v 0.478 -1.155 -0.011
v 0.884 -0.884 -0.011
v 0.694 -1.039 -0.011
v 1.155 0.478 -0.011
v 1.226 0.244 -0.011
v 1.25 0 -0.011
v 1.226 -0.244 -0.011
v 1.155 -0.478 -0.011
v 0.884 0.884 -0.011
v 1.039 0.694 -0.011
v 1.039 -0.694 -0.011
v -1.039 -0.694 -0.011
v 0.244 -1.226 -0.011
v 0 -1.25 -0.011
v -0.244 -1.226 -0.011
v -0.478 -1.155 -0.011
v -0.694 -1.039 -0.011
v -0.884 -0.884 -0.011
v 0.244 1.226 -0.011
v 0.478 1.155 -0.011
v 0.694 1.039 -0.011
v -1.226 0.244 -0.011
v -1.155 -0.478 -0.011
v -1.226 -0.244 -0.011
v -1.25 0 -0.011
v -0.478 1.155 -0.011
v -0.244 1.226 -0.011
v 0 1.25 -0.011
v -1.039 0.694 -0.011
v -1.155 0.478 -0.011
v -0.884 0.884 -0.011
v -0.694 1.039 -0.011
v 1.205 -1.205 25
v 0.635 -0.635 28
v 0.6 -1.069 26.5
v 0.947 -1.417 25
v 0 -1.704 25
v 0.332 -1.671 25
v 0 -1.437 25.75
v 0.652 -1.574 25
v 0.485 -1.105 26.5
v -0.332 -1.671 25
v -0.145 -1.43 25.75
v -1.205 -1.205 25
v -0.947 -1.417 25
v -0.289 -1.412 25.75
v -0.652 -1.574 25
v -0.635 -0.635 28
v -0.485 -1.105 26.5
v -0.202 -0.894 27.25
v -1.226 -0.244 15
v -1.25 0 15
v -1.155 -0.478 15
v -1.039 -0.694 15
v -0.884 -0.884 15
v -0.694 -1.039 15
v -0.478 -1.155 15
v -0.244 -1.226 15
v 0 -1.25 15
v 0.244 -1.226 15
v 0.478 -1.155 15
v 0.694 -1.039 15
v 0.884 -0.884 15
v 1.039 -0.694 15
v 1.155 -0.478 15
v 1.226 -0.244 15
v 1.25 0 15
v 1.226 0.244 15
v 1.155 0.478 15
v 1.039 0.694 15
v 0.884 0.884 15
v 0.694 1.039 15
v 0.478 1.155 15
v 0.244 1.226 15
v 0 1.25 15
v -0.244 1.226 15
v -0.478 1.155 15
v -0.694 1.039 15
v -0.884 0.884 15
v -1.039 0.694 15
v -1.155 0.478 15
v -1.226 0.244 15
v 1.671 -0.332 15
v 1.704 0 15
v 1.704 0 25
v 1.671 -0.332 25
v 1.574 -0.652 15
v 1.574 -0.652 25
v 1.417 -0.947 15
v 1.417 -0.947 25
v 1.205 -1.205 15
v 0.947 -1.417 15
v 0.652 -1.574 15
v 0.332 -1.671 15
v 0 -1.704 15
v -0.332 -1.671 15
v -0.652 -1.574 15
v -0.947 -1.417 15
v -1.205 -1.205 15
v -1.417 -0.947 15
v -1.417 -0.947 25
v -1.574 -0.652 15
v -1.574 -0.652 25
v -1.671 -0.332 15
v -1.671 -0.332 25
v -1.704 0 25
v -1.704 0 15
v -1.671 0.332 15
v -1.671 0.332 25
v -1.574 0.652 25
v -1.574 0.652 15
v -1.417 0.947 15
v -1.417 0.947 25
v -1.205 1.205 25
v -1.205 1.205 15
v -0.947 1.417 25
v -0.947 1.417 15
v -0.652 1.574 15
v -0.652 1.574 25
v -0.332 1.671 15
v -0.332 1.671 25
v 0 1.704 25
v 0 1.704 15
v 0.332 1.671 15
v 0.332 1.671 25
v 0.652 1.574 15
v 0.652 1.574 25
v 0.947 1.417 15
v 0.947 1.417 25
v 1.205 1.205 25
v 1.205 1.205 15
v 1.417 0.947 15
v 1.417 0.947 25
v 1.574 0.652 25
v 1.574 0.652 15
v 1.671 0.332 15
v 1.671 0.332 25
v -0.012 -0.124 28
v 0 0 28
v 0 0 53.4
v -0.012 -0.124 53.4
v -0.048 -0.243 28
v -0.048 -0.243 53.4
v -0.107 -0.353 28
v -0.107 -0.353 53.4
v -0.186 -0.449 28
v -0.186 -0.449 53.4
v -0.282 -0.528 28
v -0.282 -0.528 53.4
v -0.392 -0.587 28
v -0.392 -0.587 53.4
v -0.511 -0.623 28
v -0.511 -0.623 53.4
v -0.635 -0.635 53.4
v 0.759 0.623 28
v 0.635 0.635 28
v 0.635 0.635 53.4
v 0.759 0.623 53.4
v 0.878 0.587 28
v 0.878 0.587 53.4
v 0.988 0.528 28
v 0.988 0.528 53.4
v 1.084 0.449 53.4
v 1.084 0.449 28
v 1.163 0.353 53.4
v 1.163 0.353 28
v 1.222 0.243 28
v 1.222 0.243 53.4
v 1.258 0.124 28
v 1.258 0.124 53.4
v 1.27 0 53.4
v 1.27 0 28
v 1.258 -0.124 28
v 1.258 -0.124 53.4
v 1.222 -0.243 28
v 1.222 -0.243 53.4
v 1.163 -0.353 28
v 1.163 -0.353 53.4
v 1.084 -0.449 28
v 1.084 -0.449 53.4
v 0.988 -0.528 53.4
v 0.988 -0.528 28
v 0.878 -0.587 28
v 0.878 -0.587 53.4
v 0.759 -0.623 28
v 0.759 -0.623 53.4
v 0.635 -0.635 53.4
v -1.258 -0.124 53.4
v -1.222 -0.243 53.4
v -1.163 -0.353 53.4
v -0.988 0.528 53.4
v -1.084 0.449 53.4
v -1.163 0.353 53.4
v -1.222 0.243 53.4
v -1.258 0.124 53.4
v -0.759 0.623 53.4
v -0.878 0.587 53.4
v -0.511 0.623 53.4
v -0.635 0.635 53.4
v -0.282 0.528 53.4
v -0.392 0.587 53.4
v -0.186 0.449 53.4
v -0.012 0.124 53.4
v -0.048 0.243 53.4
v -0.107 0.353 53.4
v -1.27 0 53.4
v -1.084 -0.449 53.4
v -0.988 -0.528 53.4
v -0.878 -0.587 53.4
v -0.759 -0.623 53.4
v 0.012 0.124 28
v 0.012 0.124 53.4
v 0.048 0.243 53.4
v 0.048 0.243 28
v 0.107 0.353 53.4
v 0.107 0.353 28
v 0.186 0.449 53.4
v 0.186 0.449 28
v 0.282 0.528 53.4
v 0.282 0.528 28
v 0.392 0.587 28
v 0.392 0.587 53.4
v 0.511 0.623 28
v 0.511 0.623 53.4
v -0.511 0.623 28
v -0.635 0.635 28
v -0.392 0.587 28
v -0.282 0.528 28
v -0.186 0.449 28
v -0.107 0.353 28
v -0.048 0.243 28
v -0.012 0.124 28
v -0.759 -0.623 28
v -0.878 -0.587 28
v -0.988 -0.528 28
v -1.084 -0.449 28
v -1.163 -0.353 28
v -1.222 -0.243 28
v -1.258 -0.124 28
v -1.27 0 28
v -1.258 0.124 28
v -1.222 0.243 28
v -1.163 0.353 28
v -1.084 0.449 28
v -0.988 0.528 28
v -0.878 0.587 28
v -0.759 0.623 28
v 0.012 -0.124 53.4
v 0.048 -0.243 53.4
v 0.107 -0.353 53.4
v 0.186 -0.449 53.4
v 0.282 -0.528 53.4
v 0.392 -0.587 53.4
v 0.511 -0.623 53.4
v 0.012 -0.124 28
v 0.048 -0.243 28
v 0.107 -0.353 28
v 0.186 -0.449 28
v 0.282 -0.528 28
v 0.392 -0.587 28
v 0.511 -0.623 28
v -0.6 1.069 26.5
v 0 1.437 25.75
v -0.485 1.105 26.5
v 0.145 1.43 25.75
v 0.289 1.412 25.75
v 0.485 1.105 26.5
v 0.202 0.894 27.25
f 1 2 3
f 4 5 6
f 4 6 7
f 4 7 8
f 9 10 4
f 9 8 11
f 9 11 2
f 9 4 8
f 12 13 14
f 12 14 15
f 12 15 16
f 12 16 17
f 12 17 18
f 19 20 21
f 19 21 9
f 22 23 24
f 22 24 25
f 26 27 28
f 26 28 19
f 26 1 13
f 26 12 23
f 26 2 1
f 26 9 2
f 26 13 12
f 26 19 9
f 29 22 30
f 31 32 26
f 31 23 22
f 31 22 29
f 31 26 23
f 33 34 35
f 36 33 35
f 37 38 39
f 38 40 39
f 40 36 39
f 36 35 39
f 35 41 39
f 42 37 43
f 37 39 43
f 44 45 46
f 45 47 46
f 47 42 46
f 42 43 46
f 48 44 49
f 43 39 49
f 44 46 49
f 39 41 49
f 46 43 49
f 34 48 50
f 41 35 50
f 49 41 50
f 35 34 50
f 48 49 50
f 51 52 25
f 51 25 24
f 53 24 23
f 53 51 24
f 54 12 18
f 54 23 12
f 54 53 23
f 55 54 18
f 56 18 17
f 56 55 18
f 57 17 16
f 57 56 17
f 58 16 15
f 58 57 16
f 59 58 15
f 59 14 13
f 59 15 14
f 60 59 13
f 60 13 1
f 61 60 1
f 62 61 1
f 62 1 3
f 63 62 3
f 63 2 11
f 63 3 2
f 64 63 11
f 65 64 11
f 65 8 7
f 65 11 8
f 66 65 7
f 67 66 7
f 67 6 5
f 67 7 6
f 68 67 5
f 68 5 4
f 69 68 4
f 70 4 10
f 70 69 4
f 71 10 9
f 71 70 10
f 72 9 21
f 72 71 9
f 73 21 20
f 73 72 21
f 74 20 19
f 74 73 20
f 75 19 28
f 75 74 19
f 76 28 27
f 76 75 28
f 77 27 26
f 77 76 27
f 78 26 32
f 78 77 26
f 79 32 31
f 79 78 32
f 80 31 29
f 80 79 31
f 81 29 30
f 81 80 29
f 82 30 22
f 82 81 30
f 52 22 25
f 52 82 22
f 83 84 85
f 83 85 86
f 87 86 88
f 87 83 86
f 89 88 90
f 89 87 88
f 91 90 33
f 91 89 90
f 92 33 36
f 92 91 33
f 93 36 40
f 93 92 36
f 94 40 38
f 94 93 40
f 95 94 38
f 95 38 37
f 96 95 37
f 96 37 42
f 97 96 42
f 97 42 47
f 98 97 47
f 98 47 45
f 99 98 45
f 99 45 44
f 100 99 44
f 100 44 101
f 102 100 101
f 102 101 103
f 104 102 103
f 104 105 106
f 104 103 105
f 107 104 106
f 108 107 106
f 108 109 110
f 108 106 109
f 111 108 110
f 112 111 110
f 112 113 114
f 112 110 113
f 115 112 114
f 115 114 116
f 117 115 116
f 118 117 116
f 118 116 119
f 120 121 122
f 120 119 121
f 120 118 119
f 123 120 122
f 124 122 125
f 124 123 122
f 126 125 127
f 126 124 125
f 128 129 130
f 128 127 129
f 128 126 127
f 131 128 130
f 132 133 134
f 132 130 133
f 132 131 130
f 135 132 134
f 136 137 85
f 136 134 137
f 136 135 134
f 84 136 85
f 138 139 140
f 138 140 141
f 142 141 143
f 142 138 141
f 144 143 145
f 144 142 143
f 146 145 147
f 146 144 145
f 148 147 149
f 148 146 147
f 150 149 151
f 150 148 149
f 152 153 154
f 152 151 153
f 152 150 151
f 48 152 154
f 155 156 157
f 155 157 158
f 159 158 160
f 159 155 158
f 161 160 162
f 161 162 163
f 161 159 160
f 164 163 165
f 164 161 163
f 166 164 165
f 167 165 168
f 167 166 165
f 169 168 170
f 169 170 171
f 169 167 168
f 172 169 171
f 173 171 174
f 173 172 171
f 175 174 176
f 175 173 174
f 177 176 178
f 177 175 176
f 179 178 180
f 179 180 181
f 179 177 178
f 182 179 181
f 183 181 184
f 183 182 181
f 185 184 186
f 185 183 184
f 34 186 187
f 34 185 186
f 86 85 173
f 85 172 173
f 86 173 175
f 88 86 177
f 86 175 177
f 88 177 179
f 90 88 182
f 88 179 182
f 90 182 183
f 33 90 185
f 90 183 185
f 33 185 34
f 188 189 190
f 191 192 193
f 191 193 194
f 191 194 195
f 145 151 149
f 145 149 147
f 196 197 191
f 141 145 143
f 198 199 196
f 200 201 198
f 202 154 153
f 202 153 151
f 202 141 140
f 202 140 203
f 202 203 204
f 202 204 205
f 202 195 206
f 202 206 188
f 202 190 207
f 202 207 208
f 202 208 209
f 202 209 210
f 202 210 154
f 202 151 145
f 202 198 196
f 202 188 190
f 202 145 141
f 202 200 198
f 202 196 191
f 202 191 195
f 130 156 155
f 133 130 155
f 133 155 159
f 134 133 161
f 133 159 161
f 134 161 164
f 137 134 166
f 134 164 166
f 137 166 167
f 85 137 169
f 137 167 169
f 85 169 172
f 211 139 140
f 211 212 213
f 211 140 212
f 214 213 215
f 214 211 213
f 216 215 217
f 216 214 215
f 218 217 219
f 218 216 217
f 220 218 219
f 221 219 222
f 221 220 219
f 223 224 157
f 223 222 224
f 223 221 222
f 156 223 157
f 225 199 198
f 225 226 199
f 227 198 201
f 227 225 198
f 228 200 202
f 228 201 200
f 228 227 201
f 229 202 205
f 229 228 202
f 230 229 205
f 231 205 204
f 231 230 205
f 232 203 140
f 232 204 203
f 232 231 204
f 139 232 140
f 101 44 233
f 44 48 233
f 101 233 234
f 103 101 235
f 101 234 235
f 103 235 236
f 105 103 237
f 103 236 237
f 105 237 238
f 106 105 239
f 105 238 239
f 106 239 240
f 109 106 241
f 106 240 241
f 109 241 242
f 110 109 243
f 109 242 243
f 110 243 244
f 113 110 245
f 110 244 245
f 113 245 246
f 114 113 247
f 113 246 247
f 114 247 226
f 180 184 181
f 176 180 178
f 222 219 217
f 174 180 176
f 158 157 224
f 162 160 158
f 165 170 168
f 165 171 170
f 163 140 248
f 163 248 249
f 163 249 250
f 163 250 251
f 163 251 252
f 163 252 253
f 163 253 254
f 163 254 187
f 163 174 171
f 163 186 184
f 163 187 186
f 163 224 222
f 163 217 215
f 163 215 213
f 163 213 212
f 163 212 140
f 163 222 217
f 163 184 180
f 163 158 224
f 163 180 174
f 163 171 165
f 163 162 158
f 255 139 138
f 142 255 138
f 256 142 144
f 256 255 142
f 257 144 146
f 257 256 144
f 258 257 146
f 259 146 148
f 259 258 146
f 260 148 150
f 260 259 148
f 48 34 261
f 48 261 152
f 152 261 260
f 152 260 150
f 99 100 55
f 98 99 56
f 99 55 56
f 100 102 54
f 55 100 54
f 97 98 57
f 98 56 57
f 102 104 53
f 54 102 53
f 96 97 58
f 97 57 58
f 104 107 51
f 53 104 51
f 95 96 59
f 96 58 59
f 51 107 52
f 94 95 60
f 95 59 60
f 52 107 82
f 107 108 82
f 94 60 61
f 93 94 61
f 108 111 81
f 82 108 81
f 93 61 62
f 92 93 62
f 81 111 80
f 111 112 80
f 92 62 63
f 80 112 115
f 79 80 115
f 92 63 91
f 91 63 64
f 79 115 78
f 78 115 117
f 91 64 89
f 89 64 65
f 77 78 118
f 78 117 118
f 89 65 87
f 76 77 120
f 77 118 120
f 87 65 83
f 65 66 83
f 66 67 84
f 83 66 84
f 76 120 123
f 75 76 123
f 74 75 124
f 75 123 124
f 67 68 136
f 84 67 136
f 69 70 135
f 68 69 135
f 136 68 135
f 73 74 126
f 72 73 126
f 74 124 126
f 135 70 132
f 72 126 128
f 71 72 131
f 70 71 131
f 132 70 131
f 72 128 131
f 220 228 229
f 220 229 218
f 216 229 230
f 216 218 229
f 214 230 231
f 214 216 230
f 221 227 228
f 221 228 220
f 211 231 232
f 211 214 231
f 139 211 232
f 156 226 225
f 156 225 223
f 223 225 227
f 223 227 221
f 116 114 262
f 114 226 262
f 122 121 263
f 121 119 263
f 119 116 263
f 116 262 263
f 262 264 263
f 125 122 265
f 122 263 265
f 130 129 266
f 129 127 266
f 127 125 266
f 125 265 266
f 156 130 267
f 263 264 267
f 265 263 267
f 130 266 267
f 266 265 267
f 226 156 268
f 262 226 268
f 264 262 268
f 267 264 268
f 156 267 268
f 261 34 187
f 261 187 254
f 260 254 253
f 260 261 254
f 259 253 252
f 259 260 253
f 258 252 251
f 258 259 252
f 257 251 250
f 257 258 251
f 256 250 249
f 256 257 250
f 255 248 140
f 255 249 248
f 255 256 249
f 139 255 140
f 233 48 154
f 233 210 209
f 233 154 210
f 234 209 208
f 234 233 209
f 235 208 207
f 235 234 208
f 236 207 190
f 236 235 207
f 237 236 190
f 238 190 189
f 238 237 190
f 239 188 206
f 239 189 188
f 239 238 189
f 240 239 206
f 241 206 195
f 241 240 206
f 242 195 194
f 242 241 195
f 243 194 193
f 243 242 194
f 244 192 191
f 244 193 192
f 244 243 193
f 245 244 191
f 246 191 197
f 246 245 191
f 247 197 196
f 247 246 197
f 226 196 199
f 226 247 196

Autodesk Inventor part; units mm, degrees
ref_plane "YZ Plane" through (0, 0, 0) normal (1, 0, 0) x (0, 1, 0)
ref_plane "Work Plane7" through (0, 0, 15) normal (0, 0, 1) x (1, 0, 0)
sketch "Sketch6" plane through (0, 0, 15) normal (0, 0, 1) x (1, 0, 0)
  circle A0 centre (0, 0) radius 1.7038
  dimension "d21" = 3.4076
extrude "Extrusion2" add sketch "Sketch6" along normal blind 10
ref_plane "Work Plane4" through (0, 0, 28) normal (0, 0, 1) x (1, 0, 0)
sketch "Sketch7" plane through (0, 0, 28) normal (0, 0, 1) x (1, 0, 0)
  arc A0 (-0.635, 0.635) -> (-0.635, -0.635) centre (-0.635, 0) ccw
  arc A1 (0.635, -0.635) -> (0.635, 0.635) centre (0.635, 0) ccw
  line L0 (-0.635, 0.635) -> (0.635, 0.635)
  line L1 (0.635, -0.635) -> (-0.635, -0.635)
loft "Loft4" add profiles "Sketch7" section 1 edges at (-1.7038, 0, 25)
sketch "Sketch8" plane through (0, 0, 28) normal (0, 0, 1) x (1, 0, 0)
  arc A0 (-0.635, 0.635) -> (-0.635, -0.635) centre (-0.635, 0) ccw projected
  circle A1 centre (-0.635, 0) radius 0.635
  arc A2 (0.635, -0.635) -> (0.635, 0.635) centre (0.635, 0) ccw projected
  circle A3 centre (0.635, 0) radius 0.635
  point P0 (0, 0)
extrude "Extrusion3" add sketch "Sketch8" along normal blind 25.4
sketch "Sketch9" plane through (0, 0, 15) normal (0, 0, -1) x (-1, 0, 0)
  circle A0 centre (0, 0) radius 1.25
  dimension "d36" = 2.5
extrude "Extrusion4" add sketch "Sketch9" along normal blind 15.0114
properties part number "Male End Audio Jack"
